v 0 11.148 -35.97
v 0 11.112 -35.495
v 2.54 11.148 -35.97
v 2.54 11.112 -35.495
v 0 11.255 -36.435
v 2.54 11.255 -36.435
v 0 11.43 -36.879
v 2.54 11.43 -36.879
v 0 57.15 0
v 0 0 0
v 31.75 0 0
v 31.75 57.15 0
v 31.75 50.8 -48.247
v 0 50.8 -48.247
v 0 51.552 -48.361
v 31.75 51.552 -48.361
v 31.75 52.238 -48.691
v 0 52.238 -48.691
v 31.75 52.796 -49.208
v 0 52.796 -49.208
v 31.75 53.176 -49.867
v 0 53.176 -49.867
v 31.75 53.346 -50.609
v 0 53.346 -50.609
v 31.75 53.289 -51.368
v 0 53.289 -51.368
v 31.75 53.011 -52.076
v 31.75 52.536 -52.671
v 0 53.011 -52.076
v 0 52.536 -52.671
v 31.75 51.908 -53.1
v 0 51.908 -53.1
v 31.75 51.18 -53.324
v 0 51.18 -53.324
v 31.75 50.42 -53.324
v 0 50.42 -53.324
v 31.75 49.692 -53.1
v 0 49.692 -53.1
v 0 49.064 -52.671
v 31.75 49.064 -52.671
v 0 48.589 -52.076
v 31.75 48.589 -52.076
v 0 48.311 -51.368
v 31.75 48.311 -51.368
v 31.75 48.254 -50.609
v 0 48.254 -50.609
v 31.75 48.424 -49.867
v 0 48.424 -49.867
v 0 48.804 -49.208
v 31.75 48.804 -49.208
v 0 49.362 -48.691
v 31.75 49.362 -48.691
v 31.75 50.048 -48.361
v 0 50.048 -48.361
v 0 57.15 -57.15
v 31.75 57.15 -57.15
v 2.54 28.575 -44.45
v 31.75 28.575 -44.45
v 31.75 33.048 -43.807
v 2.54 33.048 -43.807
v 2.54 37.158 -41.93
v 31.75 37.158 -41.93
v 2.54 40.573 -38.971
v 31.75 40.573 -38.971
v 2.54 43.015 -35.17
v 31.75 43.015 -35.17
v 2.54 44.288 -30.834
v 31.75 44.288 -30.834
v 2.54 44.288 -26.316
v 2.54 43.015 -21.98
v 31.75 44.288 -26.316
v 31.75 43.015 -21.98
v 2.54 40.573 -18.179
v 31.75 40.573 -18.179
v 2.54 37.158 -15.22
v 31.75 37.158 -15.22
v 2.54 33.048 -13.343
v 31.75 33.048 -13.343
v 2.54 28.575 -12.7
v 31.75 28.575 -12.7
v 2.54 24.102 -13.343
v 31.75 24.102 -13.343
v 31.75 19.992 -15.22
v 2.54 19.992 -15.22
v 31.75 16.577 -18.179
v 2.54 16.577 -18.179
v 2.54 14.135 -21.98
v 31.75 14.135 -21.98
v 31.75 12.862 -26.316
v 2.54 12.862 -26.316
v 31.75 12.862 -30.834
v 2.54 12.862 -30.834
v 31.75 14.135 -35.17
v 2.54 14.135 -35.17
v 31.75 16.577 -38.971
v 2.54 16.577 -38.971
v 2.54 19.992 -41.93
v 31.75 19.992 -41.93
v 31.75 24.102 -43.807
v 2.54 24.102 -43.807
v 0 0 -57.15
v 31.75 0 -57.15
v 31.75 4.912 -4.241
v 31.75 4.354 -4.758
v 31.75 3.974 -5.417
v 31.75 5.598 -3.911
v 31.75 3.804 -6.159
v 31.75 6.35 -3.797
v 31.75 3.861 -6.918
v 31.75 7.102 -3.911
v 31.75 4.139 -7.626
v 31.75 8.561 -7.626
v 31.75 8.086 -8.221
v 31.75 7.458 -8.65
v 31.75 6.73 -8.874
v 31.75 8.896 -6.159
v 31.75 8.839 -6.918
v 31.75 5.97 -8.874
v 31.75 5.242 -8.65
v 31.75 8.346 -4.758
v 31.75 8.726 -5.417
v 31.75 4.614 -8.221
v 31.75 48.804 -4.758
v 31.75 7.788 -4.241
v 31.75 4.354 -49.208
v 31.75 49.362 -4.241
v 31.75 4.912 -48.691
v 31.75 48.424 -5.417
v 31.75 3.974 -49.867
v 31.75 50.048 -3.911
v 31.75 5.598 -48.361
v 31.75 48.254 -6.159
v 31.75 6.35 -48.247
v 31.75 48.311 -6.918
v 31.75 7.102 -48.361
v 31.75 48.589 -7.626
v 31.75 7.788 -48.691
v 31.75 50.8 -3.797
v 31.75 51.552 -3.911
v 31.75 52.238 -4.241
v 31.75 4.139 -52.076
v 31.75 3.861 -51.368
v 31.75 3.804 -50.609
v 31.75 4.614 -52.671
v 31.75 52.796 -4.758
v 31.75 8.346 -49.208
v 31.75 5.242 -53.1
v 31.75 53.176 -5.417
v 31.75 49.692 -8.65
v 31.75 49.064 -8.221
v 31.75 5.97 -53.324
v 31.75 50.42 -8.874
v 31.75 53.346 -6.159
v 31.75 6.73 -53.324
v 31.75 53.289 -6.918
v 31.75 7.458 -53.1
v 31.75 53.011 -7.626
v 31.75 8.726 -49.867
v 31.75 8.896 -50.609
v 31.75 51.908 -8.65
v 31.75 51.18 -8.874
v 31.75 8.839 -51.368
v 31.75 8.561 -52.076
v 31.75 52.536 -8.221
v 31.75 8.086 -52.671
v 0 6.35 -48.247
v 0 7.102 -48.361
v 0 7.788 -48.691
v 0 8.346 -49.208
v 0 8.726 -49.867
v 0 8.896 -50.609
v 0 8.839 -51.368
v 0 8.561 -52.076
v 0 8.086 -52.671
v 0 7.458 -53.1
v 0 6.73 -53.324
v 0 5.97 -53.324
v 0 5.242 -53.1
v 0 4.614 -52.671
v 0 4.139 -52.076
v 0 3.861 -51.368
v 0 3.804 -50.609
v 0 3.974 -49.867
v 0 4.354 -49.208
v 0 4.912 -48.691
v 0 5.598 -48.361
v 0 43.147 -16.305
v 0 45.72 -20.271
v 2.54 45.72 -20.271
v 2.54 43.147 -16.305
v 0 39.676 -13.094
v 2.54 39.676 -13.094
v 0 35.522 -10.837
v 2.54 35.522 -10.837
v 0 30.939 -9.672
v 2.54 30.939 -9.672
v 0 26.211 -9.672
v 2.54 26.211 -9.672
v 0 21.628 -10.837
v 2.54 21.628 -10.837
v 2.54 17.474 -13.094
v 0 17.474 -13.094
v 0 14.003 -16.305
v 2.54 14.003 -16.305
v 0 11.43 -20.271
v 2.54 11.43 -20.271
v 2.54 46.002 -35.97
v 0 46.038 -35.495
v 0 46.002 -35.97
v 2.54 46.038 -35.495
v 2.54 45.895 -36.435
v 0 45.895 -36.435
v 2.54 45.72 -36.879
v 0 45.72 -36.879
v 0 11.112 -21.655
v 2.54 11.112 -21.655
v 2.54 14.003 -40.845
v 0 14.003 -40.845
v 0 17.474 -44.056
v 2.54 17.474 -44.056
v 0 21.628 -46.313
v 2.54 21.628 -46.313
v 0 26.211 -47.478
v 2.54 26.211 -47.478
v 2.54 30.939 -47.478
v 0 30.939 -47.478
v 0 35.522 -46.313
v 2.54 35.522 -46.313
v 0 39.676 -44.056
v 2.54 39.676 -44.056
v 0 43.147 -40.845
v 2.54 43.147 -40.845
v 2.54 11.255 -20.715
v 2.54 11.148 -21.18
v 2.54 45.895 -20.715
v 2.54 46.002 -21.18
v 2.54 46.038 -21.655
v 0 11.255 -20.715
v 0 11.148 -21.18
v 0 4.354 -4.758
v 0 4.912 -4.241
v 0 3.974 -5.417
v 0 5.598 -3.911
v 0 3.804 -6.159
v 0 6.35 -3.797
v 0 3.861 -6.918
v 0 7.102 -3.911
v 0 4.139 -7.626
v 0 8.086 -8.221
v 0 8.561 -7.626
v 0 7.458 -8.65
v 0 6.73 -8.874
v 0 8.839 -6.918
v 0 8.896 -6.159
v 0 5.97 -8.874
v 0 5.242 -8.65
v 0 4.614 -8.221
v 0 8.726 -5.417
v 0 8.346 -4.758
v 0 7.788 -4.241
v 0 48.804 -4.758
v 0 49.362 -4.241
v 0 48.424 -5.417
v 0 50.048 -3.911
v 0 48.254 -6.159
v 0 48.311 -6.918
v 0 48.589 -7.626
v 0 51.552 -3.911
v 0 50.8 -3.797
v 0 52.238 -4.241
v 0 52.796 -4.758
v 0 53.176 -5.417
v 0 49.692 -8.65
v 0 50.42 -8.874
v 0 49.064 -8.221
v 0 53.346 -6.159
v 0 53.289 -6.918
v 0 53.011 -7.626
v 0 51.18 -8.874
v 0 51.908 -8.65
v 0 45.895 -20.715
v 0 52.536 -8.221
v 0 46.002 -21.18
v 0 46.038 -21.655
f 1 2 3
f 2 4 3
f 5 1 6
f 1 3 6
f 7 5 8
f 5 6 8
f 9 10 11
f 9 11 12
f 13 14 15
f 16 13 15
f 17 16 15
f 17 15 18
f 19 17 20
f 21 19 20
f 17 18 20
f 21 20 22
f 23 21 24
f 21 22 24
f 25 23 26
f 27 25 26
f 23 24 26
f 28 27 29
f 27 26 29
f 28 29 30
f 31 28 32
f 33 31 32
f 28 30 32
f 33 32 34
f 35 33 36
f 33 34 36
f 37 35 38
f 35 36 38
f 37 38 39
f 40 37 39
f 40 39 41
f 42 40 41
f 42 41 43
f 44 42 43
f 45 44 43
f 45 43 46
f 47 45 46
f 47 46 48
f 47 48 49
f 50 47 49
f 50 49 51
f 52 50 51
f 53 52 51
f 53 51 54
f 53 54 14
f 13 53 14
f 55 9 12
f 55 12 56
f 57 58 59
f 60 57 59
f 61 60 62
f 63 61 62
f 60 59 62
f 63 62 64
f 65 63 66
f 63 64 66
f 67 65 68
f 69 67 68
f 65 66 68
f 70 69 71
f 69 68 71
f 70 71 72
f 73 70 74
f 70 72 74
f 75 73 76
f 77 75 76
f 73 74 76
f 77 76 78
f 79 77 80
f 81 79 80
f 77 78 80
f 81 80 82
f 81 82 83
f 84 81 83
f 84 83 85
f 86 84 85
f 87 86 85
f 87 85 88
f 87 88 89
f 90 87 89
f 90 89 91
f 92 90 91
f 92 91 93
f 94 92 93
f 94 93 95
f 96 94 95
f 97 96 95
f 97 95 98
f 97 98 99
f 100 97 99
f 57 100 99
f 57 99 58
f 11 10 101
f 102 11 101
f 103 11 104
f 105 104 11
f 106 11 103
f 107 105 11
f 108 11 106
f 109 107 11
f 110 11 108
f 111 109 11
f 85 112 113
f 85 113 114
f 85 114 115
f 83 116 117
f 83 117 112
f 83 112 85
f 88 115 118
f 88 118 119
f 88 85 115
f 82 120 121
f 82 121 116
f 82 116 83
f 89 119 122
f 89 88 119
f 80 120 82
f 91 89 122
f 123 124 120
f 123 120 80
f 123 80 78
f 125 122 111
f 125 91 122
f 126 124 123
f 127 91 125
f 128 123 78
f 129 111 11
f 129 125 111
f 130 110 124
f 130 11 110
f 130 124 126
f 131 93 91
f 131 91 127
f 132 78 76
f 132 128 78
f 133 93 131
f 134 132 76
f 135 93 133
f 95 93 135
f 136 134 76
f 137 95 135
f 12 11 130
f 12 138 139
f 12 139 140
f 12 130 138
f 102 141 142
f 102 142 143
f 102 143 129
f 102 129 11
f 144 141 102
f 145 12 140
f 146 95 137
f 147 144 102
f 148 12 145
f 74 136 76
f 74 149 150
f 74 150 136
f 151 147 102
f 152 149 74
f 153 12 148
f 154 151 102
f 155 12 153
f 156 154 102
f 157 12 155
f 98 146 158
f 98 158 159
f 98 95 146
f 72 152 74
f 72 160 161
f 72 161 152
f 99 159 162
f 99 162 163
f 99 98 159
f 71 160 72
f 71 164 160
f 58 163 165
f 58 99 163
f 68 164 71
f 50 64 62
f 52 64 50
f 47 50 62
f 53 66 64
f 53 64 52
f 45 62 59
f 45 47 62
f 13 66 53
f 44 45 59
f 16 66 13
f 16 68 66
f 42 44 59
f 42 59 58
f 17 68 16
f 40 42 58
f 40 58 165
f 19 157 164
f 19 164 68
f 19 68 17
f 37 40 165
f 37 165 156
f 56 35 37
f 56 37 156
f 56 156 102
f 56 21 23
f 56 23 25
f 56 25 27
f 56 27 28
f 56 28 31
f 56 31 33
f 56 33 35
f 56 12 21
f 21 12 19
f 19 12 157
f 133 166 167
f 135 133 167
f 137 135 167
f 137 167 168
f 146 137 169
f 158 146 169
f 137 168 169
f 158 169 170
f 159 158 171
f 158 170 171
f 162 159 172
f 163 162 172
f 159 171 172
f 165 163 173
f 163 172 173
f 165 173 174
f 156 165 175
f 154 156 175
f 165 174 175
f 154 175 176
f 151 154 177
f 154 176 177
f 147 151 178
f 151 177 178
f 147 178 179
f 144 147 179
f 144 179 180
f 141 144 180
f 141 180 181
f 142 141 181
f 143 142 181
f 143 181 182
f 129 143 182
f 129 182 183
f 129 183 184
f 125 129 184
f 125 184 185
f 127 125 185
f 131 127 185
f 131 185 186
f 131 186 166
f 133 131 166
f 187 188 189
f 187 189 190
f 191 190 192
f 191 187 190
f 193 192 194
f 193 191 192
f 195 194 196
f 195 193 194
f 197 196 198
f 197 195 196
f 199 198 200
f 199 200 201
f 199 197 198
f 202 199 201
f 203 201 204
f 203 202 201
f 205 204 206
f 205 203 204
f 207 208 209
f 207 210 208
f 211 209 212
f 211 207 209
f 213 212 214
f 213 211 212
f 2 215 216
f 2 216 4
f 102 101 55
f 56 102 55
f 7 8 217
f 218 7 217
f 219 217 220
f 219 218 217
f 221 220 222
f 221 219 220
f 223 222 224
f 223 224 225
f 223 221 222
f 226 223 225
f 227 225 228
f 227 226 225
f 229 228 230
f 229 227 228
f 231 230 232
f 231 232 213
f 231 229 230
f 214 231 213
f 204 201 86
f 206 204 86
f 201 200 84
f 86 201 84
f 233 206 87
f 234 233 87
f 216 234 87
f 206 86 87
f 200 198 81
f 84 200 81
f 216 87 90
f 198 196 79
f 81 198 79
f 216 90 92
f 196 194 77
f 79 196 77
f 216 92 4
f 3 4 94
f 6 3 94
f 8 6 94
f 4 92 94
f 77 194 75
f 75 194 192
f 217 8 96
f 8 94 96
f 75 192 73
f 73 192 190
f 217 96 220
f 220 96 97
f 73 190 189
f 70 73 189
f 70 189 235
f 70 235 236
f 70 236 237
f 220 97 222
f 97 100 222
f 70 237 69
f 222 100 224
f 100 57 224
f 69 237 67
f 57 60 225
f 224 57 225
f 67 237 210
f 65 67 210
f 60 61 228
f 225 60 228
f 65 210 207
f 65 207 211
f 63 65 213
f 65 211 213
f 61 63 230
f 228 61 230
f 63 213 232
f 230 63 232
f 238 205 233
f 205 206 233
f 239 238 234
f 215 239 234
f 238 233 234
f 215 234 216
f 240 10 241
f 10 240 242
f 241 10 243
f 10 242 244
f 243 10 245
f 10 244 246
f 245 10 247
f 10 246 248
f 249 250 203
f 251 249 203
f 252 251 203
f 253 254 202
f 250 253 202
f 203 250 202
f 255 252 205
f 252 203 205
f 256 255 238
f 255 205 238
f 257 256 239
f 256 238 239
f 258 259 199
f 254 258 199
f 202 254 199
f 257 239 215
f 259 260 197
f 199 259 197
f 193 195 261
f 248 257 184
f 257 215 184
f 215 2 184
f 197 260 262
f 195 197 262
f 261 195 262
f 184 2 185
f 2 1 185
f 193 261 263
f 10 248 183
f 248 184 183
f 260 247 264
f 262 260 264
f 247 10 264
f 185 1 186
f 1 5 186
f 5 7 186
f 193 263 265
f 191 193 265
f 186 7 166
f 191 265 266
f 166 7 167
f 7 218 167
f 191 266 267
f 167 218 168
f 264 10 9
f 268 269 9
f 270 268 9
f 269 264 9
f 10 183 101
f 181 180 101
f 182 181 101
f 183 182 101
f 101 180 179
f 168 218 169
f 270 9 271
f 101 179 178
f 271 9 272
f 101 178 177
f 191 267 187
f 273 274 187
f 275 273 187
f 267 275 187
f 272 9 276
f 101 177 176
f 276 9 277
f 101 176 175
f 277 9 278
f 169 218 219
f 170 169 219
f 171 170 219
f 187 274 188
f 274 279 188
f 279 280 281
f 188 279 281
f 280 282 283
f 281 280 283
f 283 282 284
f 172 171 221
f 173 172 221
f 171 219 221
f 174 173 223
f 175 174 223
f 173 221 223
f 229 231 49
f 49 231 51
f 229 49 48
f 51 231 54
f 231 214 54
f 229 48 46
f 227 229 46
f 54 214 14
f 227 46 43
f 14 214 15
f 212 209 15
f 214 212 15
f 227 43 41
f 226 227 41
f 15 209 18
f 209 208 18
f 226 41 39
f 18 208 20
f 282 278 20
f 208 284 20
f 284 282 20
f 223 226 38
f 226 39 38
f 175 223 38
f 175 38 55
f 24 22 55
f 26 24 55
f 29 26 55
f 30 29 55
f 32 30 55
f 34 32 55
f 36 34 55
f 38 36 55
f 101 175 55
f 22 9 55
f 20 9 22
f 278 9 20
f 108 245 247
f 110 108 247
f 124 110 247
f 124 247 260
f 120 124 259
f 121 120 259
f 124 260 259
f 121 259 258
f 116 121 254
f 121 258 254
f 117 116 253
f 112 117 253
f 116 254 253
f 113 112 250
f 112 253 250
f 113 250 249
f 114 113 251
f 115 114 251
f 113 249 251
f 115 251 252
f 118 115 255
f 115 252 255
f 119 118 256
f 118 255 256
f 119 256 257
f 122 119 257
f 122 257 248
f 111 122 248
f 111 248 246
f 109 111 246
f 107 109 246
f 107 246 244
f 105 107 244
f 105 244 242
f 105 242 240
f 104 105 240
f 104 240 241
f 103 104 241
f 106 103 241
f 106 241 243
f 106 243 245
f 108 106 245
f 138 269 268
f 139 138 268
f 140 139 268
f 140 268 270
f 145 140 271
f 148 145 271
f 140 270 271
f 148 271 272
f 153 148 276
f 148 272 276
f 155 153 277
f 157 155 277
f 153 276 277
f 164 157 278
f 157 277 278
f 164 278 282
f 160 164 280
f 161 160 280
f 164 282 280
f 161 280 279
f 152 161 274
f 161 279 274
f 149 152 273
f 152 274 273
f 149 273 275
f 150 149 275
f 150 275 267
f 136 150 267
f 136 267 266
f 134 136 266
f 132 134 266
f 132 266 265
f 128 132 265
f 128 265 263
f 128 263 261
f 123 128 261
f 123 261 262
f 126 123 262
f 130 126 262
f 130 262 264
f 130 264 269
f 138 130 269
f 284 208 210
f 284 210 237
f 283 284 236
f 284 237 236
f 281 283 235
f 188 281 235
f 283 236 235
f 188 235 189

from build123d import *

# Parameters (mm, degrees)
SKETCH2_W               = 57.15
SKETCH2_H               = 57.15
BOSS_EXTRUDE2_DEPTH     = 31.75
SKETCH3_R               = 15.875
CUT_EXTRUDE1_DEPTH      = 87.834944003
CUT_EXTRUDE2_DEPTH      = 2.54
FILLET1_R               = 3.175
F_1_4_20_TAPPED_HOLE1_D = 5.1054


with BuildPart() as part:
    # Sketch2 → Boss-Extrude2 (new body)
    with BuildSketch(Plane(origin=(0, 0, 0), x_dir=(0, 0, -1), z_dir=(1, 0, 0))):
        with Locations((28.575, 28.575)):
            Rectangle(SKETCH2_W, SKETCH2_H)
    extrude(amount=BOSS_EXTRUDE2_DEPTH)

    # Sketch3 → Cut-Extrude1 (cut, through all)
    with BuildSketch(Plane(origin=(31.75, 0, 0), x_dir=(0, 0, -1), z_dir=(1, 0, 0))):
        with Locations((28.575, 28.575)):
            Circle(SKETCH3_R)
    extrude(amount=-CUT_EXTRUDE1_DEPTH, mode=Mode.SUBTRACT)

    # Sketch4 → Cut-Extrude2 (cut)
    with BuildSketch(Plane.ZY):
        with BuildLine():
            Line((-36.188382543, 46.0375), (-20.961617457, 46.0375))
            ThreePointArc((-20.961617457, 46.0375), (-9.525, 28.575), (-20.961617457, 11.1125))
            Line((-20.961617457, 11.1125), (-36.188382543, 11.1125))
            ThreePointArc((-36.188382543, 11.1125), (-47.625, 28.575), (-36.188382543, 46.0375))
        make_face()
    extrude(amount=-CUT_EXTRUDE2_DEPTH, mode=Mode.SUBTRACT)

    # Fillet1
    fillet1_edges = [part.edges().sort_by_distance(p)[0] for p in [
        (1.27, 11.1125, -36.188382543),
        (1.27, 46.0375, -36.188382543),
        (1.27, 46.0375, -20.961617457),
        (1.27, 11.1125, -20.961617457),
    ]]
    fillet(fillet1_edges, radius=FILLET1_R)

    # 1/4-20 Tapped Hole1 (through all)
    with Locations(Plane(origin=(31.75, 0, 0), x_dir=(0, 0, -1), z_dir=(1, 0, 0))):
        with Locations((6.35, 50.8), (50.8, 50.8), (50.8, 6.35), (6.35, 6.35), (28.575, 28.575)):
            Hole(F_1_4_20_TAPPED_HOLE1_D / 2)


solid = part.part
